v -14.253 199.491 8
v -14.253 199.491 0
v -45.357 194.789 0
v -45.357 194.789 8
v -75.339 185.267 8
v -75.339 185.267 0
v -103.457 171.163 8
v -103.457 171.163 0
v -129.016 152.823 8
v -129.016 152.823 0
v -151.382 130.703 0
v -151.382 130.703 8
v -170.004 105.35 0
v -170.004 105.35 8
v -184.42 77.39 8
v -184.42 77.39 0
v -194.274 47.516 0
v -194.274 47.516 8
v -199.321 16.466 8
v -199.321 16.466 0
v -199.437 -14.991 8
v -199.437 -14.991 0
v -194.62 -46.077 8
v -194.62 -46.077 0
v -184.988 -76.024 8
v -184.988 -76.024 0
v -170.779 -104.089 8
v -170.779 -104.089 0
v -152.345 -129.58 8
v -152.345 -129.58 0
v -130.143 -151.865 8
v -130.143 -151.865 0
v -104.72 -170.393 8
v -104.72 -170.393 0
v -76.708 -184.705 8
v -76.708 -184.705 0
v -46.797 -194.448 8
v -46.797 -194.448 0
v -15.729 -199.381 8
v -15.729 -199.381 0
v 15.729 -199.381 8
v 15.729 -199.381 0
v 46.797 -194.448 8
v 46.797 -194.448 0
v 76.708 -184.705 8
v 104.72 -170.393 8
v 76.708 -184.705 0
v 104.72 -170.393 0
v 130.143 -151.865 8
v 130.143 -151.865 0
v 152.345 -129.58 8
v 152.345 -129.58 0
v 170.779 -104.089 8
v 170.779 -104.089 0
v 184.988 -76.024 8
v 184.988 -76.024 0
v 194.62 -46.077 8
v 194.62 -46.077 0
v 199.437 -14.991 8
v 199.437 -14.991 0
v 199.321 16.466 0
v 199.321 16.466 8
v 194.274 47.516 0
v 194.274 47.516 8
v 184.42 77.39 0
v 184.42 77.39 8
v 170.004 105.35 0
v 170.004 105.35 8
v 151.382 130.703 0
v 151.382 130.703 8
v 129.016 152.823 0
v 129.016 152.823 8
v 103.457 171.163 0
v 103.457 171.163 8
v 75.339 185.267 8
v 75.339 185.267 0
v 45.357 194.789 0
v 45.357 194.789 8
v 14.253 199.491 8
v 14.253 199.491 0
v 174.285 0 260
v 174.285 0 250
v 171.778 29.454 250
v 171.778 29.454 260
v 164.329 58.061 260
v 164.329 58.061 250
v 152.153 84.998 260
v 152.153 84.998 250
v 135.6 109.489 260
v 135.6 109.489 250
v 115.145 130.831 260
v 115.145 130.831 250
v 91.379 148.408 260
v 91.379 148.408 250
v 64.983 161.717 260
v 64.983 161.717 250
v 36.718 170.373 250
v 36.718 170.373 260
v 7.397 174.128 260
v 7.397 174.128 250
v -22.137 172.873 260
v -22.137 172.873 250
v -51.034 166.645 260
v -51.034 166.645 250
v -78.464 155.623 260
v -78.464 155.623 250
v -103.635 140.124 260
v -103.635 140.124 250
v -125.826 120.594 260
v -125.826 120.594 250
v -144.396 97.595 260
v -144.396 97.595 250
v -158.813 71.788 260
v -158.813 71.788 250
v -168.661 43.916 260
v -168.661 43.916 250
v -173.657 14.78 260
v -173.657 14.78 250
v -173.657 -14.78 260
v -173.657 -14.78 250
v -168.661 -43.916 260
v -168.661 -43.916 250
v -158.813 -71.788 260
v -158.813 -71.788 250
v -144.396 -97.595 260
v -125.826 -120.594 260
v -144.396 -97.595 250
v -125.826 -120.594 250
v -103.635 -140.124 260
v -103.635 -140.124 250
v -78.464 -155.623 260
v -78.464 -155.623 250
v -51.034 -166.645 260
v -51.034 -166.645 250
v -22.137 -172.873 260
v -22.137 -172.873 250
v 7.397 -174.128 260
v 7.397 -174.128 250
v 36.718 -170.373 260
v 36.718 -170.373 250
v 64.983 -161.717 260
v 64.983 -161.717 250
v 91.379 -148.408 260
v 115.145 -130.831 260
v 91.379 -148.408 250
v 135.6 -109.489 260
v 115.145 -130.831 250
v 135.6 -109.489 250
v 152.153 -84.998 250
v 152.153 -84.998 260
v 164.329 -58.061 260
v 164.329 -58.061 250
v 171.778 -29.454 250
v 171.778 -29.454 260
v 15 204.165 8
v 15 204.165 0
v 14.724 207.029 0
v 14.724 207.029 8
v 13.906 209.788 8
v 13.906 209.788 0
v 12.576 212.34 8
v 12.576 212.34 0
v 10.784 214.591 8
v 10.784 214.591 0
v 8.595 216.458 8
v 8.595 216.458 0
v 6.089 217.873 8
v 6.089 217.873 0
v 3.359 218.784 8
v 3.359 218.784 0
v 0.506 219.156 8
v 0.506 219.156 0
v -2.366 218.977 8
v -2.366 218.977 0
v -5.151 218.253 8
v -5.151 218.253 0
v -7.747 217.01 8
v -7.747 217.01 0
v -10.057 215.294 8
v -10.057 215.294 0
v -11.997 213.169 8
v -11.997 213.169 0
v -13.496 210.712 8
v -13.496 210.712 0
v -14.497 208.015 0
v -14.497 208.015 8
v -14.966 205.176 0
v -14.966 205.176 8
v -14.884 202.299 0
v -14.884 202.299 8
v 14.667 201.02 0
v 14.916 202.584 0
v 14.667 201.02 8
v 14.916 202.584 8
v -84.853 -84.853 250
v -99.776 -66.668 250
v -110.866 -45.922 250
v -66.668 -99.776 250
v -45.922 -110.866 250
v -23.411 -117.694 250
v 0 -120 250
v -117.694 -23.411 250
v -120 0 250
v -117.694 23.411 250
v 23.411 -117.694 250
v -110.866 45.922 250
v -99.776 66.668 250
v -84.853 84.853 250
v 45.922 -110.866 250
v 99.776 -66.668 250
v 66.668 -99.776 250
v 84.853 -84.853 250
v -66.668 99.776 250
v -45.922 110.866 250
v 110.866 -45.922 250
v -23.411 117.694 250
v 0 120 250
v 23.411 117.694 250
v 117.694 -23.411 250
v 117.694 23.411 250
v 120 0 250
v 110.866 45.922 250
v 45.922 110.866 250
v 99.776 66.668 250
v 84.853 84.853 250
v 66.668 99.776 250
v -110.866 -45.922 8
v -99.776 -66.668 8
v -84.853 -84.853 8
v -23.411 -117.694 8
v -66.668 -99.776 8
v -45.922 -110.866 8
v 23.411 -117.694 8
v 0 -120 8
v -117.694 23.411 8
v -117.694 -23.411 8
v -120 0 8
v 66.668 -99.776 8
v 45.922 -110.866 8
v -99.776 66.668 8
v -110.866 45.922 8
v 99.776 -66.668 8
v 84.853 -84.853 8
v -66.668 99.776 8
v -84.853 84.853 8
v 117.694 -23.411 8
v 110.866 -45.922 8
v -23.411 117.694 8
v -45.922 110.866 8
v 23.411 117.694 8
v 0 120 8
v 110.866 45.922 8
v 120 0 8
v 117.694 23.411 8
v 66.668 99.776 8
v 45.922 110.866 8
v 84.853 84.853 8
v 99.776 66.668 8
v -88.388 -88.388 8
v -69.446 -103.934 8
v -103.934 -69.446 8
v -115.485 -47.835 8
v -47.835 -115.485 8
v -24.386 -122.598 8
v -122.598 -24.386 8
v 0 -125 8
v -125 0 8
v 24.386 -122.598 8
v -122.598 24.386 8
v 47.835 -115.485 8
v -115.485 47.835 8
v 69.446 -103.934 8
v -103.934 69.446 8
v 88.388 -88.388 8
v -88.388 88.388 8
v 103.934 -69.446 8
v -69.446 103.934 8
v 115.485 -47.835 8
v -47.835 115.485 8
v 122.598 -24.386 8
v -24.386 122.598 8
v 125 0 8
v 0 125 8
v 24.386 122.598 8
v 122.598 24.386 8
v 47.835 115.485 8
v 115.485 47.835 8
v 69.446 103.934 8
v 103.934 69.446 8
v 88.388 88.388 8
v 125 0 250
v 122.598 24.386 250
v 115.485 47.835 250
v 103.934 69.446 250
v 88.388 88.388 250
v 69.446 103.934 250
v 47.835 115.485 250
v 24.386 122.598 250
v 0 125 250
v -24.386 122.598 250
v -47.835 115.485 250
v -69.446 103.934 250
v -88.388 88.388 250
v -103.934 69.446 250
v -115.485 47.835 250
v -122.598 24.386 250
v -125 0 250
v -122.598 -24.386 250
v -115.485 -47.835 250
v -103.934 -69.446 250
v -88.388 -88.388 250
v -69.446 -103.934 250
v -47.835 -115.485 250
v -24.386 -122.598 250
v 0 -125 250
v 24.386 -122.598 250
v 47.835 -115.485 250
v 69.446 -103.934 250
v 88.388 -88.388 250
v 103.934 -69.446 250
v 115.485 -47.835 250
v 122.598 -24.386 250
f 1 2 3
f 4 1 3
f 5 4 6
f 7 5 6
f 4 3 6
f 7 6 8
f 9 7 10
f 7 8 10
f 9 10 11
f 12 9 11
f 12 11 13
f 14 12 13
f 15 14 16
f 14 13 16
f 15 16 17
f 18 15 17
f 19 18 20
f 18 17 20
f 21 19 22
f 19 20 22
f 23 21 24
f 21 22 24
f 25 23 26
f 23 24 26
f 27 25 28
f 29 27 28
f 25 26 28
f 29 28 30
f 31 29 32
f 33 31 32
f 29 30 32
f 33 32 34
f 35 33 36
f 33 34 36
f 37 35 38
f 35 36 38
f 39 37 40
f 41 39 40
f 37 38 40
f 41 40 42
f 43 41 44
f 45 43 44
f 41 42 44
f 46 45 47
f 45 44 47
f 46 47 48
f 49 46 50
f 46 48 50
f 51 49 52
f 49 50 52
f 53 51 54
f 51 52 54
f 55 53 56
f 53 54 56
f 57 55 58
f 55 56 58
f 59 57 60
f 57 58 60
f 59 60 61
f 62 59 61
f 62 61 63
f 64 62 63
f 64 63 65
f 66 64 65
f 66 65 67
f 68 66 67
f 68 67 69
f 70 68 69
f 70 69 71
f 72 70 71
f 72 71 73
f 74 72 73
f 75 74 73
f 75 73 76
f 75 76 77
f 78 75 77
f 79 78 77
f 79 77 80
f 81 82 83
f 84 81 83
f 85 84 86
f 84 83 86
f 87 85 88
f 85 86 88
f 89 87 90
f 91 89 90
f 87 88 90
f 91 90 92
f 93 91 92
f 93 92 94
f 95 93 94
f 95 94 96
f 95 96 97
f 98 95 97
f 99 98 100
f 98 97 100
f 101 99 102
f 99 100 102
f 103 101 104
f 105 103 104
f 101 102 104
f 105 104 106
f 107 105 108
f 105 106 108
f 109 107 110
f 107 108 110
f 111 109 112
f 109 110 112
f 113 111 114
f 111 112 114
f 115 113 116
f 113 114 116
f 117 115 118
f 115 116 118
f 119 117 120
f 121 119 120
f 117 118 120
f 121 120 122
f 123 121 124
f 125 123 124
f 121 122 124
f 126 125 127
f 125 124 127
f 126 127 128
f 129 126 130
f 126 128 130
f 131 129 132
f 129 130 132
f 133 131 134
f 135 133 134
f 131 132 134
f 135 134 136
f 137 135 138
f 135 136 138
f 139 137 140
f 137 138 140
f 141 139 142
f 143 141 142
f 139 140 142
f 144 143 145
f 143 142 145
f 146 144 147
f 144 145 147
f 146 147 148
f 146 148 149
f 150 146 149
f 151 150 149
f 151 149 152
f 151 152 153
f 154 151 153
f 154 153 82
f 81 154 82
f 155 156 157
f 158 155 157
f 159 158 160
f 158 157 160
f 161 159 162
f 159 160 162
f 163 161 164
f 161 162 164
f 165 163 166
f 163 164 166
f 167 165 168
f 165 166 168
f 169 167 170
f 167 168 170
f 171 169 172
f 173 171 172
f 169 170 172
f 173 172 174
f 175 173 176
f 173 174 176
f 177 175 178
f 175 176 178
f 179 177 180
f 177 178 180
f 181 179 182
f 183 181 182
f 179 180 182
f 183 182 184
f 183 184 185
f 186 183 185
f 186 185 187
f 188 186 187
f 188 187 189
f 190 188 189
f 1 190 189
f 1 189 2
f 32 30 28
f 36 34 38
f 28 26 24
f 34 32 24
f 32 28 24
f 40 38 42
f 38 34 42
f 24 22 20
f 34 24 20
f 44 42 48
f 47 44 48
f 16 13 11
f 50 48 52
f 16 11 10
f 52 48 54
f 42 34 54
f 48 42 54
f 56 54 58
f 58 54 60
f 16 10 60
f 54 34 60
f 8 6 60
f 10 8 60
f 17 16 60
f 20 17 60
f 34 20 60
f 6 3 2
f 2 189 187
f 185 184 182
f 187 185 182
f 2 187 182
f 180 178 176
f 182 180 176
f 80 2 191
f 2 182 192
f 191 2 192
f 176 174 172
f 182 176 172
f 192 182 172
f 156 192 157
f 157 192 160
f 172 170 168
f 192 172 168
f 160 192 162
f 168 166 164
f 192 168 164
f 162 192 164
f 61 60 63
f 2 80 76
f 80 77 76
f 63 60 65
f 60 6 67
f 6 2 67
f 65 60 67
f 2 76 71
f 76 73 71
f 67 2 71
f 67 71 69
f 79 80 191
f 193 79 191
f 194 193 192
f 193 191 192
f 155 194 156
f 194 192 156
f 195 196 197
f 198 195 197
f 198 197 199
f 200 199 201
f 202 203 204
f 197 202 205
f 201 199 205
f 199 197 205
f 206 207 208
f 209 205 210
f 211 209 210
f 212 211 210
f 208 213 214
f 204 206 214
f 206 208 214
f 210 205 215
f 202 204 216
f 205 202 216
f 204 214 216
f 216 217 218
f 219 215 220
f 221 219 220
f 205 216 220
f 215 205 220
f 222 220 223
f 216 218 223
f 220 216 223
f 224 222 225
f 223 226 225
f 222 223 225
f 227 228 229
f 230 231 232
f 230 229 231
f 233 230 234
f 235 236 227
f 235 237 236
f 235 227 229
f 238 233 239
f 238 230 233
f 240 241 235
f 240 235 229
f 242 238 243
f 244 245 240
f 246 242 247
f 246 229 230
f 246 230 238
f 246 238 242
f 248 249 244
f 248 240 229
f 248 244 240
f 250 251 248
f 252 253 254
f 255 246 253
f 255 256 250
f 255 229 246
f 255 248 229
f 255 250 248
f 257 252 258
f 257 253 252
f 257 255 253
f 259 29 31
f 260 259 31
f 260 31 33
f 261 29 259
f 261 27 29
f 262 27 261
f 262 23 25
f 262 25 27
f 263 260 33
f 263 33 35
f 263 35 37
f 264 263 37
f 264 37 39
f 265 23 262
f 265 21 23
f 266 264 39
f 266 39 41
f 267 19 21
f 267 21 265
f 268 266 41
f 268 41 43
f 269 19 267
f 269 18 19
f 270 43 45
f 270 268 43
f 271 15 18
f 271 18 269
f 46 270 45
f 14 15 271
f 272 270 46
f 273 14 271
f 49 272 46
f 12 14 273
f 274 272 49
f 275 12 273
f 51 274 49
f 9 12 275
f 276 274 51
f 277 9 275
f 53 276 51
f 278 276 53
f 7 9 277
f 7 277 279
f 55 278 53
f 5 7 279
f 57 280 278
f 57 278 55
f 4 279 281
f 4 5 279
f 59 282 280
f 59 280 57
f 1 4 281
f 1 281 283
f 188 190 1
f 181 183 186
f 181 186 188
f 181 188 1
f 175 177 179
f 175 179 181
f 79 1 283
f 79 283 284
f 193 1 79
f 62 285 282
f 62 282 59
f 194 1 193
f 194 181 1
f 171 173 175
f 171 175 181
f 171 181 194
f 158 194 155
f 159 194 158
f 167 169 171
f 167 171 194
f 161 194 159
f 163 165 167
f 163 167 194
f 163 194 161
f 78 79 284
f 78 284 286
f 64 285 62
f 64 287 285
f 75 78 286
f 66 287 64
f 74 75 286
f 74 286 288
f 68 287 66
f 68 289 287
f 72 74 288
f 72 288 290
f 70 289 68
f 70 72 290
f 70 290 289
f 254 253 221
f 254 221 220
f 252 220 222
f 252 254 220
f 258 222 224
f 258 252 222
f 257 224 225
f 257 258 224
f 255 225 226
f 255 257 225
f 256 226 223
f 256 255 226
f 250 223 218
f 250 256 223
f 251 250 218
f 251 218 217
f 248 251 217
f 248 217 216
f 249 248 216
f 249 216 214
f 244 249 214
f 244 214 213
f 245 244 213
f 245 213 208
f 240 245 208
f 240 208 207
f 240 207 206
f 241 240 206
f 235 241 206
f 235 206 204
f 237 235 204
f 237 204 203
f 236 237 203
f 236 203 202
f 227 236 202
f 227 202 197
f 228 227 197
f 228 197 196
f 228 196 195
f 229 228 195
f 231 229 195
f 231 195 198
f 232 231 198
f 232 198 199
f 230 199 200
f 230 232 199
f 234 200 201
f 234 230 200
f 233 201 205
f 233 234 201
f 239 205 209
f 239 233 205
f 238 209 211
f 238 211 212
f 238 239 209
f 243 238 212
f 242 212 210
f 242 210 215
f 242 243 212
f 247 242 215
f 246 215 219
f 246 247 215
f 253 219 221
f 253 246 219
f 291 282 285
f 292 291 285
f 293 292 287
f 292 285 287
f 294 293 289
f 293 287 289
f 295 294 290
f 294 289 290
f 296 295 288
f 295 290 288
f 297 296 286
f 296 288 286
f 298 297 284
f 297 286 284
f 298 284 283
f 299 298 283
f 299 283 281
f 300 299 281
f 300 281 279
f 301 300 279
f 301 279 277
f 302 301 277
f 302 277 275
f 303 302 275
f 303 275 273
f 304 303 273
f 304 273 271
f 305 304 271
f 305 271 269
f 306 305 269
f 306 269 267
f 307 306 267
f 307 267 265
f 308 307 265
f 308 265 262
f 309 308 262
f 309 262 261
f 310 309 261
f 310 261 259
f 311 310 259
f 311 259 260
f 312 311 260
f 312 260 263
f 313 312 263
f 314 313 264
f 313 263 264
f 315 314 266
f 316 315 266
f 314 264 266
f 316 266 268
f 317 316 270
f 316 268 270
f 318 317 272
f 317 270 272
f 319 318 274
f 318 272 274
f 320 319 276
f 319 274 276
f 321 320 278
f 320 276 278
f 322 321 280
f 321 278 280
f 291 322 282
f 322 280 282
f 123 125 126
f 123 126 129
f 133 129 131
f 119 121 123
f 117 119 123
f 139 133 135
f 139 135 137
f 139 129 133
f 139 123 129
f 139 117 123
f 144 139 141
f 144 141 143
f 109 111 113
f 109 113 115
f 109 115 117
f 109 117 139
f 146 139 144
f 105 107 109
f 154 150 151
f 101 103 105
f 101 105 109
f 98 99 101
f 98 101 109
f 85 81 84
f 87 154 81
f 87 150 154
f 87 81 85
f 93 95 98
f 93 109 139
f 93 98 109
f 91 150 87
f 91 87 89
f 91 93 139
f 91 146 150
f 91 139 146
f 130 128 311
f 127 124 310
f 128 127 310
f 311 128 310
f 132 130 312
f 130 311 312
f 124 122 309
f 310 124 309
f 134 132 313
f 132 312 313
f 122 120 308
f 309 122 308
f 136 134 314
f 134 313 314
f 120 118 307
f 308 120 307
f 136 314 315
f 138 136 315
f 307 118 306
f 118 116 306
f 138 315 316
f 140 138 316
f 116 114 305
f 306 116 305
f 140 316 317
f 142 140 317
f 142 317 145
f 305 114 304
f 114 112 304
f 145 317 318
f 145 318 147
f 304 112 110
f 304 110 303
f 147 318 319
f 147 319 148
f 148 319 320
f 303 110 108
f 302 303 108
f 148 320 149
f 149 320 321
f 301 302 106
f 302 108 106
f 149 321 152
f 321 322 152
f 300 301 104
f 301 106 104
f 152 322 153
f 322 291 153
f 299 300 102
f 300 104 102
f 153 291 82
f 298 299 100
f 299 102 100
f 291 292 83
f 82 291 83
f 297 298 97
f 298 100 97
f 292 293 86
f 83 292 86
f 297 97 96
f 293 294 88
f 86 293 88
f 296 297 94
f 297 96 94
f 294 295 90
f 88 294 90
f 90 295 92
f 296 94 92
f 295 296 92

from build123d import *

# Parameters (mm, degrees)
F0_R     = 125
F0_R_2   = 120
F1_DEPTH = 250
F3_DEPTH = 8
F4_R     = 174.2845789598
F5_DEPTH = 10


with BuildPart() as f1:
    # F0 (on Top) → F1 (new body)
    with BuildSketch(Plane.XY):
        Circle(F0_R)
        Circle(F0_R_2, mode=Mode.SUBTRACT)
    extrude(amount=F1_DEPTH)

    # F2 (on Top) → F3 (join)
    with BuildSketch(Plane.XY):
        with BuildLine():
            ThreePointArc((14.2534139423, 199.4914539297), (14.8121775768, 201.7984987702), (15, 204.1648029419))
            ThreePointArc((15, 204.1648029419), (-2.3663041716, 218.9769805187), (-14.2534139423, 199.4914539297))
            ThreePointArc((-14.2534139423, 199.4914539297), (0, 200), (14.2534139423, 199.4914539297))
        make_face()
        with BuildLine():
            ThreePointArc((14.2534139423, 199.4914539297), (0, 200), (-14.2534139423, 199.4914539297))
            ThreePointArc((-14.2534139423, 199.4914539297), (0, 189.1648029419), (14.2534139423, 199.4914539297))
        make_face()
        with BuildLine():
            ThreePointArc((14.2534139423, 199.4914539297), (0, 189.1648029419), (-14.2534139423, 199.4914539297))
            ThreePointArc((-14.2534139423, 199.4914539297), (-136.2888792447, -146.3739778589), (200, 0))
            ThreePointArc((200, 0), (146.3739778589, 136.2888792447), (14.2534139423, 199.4914539297))
        make_face()
    extrude(amount=F3_DEPTH)

    # F4 (on face) → F5 (join)
    with BuildSketch(Plane.XY.offset(250)):
        Circle(F4_R)
    extrude(amount=F5_DEPTH)


solid = f1.part
